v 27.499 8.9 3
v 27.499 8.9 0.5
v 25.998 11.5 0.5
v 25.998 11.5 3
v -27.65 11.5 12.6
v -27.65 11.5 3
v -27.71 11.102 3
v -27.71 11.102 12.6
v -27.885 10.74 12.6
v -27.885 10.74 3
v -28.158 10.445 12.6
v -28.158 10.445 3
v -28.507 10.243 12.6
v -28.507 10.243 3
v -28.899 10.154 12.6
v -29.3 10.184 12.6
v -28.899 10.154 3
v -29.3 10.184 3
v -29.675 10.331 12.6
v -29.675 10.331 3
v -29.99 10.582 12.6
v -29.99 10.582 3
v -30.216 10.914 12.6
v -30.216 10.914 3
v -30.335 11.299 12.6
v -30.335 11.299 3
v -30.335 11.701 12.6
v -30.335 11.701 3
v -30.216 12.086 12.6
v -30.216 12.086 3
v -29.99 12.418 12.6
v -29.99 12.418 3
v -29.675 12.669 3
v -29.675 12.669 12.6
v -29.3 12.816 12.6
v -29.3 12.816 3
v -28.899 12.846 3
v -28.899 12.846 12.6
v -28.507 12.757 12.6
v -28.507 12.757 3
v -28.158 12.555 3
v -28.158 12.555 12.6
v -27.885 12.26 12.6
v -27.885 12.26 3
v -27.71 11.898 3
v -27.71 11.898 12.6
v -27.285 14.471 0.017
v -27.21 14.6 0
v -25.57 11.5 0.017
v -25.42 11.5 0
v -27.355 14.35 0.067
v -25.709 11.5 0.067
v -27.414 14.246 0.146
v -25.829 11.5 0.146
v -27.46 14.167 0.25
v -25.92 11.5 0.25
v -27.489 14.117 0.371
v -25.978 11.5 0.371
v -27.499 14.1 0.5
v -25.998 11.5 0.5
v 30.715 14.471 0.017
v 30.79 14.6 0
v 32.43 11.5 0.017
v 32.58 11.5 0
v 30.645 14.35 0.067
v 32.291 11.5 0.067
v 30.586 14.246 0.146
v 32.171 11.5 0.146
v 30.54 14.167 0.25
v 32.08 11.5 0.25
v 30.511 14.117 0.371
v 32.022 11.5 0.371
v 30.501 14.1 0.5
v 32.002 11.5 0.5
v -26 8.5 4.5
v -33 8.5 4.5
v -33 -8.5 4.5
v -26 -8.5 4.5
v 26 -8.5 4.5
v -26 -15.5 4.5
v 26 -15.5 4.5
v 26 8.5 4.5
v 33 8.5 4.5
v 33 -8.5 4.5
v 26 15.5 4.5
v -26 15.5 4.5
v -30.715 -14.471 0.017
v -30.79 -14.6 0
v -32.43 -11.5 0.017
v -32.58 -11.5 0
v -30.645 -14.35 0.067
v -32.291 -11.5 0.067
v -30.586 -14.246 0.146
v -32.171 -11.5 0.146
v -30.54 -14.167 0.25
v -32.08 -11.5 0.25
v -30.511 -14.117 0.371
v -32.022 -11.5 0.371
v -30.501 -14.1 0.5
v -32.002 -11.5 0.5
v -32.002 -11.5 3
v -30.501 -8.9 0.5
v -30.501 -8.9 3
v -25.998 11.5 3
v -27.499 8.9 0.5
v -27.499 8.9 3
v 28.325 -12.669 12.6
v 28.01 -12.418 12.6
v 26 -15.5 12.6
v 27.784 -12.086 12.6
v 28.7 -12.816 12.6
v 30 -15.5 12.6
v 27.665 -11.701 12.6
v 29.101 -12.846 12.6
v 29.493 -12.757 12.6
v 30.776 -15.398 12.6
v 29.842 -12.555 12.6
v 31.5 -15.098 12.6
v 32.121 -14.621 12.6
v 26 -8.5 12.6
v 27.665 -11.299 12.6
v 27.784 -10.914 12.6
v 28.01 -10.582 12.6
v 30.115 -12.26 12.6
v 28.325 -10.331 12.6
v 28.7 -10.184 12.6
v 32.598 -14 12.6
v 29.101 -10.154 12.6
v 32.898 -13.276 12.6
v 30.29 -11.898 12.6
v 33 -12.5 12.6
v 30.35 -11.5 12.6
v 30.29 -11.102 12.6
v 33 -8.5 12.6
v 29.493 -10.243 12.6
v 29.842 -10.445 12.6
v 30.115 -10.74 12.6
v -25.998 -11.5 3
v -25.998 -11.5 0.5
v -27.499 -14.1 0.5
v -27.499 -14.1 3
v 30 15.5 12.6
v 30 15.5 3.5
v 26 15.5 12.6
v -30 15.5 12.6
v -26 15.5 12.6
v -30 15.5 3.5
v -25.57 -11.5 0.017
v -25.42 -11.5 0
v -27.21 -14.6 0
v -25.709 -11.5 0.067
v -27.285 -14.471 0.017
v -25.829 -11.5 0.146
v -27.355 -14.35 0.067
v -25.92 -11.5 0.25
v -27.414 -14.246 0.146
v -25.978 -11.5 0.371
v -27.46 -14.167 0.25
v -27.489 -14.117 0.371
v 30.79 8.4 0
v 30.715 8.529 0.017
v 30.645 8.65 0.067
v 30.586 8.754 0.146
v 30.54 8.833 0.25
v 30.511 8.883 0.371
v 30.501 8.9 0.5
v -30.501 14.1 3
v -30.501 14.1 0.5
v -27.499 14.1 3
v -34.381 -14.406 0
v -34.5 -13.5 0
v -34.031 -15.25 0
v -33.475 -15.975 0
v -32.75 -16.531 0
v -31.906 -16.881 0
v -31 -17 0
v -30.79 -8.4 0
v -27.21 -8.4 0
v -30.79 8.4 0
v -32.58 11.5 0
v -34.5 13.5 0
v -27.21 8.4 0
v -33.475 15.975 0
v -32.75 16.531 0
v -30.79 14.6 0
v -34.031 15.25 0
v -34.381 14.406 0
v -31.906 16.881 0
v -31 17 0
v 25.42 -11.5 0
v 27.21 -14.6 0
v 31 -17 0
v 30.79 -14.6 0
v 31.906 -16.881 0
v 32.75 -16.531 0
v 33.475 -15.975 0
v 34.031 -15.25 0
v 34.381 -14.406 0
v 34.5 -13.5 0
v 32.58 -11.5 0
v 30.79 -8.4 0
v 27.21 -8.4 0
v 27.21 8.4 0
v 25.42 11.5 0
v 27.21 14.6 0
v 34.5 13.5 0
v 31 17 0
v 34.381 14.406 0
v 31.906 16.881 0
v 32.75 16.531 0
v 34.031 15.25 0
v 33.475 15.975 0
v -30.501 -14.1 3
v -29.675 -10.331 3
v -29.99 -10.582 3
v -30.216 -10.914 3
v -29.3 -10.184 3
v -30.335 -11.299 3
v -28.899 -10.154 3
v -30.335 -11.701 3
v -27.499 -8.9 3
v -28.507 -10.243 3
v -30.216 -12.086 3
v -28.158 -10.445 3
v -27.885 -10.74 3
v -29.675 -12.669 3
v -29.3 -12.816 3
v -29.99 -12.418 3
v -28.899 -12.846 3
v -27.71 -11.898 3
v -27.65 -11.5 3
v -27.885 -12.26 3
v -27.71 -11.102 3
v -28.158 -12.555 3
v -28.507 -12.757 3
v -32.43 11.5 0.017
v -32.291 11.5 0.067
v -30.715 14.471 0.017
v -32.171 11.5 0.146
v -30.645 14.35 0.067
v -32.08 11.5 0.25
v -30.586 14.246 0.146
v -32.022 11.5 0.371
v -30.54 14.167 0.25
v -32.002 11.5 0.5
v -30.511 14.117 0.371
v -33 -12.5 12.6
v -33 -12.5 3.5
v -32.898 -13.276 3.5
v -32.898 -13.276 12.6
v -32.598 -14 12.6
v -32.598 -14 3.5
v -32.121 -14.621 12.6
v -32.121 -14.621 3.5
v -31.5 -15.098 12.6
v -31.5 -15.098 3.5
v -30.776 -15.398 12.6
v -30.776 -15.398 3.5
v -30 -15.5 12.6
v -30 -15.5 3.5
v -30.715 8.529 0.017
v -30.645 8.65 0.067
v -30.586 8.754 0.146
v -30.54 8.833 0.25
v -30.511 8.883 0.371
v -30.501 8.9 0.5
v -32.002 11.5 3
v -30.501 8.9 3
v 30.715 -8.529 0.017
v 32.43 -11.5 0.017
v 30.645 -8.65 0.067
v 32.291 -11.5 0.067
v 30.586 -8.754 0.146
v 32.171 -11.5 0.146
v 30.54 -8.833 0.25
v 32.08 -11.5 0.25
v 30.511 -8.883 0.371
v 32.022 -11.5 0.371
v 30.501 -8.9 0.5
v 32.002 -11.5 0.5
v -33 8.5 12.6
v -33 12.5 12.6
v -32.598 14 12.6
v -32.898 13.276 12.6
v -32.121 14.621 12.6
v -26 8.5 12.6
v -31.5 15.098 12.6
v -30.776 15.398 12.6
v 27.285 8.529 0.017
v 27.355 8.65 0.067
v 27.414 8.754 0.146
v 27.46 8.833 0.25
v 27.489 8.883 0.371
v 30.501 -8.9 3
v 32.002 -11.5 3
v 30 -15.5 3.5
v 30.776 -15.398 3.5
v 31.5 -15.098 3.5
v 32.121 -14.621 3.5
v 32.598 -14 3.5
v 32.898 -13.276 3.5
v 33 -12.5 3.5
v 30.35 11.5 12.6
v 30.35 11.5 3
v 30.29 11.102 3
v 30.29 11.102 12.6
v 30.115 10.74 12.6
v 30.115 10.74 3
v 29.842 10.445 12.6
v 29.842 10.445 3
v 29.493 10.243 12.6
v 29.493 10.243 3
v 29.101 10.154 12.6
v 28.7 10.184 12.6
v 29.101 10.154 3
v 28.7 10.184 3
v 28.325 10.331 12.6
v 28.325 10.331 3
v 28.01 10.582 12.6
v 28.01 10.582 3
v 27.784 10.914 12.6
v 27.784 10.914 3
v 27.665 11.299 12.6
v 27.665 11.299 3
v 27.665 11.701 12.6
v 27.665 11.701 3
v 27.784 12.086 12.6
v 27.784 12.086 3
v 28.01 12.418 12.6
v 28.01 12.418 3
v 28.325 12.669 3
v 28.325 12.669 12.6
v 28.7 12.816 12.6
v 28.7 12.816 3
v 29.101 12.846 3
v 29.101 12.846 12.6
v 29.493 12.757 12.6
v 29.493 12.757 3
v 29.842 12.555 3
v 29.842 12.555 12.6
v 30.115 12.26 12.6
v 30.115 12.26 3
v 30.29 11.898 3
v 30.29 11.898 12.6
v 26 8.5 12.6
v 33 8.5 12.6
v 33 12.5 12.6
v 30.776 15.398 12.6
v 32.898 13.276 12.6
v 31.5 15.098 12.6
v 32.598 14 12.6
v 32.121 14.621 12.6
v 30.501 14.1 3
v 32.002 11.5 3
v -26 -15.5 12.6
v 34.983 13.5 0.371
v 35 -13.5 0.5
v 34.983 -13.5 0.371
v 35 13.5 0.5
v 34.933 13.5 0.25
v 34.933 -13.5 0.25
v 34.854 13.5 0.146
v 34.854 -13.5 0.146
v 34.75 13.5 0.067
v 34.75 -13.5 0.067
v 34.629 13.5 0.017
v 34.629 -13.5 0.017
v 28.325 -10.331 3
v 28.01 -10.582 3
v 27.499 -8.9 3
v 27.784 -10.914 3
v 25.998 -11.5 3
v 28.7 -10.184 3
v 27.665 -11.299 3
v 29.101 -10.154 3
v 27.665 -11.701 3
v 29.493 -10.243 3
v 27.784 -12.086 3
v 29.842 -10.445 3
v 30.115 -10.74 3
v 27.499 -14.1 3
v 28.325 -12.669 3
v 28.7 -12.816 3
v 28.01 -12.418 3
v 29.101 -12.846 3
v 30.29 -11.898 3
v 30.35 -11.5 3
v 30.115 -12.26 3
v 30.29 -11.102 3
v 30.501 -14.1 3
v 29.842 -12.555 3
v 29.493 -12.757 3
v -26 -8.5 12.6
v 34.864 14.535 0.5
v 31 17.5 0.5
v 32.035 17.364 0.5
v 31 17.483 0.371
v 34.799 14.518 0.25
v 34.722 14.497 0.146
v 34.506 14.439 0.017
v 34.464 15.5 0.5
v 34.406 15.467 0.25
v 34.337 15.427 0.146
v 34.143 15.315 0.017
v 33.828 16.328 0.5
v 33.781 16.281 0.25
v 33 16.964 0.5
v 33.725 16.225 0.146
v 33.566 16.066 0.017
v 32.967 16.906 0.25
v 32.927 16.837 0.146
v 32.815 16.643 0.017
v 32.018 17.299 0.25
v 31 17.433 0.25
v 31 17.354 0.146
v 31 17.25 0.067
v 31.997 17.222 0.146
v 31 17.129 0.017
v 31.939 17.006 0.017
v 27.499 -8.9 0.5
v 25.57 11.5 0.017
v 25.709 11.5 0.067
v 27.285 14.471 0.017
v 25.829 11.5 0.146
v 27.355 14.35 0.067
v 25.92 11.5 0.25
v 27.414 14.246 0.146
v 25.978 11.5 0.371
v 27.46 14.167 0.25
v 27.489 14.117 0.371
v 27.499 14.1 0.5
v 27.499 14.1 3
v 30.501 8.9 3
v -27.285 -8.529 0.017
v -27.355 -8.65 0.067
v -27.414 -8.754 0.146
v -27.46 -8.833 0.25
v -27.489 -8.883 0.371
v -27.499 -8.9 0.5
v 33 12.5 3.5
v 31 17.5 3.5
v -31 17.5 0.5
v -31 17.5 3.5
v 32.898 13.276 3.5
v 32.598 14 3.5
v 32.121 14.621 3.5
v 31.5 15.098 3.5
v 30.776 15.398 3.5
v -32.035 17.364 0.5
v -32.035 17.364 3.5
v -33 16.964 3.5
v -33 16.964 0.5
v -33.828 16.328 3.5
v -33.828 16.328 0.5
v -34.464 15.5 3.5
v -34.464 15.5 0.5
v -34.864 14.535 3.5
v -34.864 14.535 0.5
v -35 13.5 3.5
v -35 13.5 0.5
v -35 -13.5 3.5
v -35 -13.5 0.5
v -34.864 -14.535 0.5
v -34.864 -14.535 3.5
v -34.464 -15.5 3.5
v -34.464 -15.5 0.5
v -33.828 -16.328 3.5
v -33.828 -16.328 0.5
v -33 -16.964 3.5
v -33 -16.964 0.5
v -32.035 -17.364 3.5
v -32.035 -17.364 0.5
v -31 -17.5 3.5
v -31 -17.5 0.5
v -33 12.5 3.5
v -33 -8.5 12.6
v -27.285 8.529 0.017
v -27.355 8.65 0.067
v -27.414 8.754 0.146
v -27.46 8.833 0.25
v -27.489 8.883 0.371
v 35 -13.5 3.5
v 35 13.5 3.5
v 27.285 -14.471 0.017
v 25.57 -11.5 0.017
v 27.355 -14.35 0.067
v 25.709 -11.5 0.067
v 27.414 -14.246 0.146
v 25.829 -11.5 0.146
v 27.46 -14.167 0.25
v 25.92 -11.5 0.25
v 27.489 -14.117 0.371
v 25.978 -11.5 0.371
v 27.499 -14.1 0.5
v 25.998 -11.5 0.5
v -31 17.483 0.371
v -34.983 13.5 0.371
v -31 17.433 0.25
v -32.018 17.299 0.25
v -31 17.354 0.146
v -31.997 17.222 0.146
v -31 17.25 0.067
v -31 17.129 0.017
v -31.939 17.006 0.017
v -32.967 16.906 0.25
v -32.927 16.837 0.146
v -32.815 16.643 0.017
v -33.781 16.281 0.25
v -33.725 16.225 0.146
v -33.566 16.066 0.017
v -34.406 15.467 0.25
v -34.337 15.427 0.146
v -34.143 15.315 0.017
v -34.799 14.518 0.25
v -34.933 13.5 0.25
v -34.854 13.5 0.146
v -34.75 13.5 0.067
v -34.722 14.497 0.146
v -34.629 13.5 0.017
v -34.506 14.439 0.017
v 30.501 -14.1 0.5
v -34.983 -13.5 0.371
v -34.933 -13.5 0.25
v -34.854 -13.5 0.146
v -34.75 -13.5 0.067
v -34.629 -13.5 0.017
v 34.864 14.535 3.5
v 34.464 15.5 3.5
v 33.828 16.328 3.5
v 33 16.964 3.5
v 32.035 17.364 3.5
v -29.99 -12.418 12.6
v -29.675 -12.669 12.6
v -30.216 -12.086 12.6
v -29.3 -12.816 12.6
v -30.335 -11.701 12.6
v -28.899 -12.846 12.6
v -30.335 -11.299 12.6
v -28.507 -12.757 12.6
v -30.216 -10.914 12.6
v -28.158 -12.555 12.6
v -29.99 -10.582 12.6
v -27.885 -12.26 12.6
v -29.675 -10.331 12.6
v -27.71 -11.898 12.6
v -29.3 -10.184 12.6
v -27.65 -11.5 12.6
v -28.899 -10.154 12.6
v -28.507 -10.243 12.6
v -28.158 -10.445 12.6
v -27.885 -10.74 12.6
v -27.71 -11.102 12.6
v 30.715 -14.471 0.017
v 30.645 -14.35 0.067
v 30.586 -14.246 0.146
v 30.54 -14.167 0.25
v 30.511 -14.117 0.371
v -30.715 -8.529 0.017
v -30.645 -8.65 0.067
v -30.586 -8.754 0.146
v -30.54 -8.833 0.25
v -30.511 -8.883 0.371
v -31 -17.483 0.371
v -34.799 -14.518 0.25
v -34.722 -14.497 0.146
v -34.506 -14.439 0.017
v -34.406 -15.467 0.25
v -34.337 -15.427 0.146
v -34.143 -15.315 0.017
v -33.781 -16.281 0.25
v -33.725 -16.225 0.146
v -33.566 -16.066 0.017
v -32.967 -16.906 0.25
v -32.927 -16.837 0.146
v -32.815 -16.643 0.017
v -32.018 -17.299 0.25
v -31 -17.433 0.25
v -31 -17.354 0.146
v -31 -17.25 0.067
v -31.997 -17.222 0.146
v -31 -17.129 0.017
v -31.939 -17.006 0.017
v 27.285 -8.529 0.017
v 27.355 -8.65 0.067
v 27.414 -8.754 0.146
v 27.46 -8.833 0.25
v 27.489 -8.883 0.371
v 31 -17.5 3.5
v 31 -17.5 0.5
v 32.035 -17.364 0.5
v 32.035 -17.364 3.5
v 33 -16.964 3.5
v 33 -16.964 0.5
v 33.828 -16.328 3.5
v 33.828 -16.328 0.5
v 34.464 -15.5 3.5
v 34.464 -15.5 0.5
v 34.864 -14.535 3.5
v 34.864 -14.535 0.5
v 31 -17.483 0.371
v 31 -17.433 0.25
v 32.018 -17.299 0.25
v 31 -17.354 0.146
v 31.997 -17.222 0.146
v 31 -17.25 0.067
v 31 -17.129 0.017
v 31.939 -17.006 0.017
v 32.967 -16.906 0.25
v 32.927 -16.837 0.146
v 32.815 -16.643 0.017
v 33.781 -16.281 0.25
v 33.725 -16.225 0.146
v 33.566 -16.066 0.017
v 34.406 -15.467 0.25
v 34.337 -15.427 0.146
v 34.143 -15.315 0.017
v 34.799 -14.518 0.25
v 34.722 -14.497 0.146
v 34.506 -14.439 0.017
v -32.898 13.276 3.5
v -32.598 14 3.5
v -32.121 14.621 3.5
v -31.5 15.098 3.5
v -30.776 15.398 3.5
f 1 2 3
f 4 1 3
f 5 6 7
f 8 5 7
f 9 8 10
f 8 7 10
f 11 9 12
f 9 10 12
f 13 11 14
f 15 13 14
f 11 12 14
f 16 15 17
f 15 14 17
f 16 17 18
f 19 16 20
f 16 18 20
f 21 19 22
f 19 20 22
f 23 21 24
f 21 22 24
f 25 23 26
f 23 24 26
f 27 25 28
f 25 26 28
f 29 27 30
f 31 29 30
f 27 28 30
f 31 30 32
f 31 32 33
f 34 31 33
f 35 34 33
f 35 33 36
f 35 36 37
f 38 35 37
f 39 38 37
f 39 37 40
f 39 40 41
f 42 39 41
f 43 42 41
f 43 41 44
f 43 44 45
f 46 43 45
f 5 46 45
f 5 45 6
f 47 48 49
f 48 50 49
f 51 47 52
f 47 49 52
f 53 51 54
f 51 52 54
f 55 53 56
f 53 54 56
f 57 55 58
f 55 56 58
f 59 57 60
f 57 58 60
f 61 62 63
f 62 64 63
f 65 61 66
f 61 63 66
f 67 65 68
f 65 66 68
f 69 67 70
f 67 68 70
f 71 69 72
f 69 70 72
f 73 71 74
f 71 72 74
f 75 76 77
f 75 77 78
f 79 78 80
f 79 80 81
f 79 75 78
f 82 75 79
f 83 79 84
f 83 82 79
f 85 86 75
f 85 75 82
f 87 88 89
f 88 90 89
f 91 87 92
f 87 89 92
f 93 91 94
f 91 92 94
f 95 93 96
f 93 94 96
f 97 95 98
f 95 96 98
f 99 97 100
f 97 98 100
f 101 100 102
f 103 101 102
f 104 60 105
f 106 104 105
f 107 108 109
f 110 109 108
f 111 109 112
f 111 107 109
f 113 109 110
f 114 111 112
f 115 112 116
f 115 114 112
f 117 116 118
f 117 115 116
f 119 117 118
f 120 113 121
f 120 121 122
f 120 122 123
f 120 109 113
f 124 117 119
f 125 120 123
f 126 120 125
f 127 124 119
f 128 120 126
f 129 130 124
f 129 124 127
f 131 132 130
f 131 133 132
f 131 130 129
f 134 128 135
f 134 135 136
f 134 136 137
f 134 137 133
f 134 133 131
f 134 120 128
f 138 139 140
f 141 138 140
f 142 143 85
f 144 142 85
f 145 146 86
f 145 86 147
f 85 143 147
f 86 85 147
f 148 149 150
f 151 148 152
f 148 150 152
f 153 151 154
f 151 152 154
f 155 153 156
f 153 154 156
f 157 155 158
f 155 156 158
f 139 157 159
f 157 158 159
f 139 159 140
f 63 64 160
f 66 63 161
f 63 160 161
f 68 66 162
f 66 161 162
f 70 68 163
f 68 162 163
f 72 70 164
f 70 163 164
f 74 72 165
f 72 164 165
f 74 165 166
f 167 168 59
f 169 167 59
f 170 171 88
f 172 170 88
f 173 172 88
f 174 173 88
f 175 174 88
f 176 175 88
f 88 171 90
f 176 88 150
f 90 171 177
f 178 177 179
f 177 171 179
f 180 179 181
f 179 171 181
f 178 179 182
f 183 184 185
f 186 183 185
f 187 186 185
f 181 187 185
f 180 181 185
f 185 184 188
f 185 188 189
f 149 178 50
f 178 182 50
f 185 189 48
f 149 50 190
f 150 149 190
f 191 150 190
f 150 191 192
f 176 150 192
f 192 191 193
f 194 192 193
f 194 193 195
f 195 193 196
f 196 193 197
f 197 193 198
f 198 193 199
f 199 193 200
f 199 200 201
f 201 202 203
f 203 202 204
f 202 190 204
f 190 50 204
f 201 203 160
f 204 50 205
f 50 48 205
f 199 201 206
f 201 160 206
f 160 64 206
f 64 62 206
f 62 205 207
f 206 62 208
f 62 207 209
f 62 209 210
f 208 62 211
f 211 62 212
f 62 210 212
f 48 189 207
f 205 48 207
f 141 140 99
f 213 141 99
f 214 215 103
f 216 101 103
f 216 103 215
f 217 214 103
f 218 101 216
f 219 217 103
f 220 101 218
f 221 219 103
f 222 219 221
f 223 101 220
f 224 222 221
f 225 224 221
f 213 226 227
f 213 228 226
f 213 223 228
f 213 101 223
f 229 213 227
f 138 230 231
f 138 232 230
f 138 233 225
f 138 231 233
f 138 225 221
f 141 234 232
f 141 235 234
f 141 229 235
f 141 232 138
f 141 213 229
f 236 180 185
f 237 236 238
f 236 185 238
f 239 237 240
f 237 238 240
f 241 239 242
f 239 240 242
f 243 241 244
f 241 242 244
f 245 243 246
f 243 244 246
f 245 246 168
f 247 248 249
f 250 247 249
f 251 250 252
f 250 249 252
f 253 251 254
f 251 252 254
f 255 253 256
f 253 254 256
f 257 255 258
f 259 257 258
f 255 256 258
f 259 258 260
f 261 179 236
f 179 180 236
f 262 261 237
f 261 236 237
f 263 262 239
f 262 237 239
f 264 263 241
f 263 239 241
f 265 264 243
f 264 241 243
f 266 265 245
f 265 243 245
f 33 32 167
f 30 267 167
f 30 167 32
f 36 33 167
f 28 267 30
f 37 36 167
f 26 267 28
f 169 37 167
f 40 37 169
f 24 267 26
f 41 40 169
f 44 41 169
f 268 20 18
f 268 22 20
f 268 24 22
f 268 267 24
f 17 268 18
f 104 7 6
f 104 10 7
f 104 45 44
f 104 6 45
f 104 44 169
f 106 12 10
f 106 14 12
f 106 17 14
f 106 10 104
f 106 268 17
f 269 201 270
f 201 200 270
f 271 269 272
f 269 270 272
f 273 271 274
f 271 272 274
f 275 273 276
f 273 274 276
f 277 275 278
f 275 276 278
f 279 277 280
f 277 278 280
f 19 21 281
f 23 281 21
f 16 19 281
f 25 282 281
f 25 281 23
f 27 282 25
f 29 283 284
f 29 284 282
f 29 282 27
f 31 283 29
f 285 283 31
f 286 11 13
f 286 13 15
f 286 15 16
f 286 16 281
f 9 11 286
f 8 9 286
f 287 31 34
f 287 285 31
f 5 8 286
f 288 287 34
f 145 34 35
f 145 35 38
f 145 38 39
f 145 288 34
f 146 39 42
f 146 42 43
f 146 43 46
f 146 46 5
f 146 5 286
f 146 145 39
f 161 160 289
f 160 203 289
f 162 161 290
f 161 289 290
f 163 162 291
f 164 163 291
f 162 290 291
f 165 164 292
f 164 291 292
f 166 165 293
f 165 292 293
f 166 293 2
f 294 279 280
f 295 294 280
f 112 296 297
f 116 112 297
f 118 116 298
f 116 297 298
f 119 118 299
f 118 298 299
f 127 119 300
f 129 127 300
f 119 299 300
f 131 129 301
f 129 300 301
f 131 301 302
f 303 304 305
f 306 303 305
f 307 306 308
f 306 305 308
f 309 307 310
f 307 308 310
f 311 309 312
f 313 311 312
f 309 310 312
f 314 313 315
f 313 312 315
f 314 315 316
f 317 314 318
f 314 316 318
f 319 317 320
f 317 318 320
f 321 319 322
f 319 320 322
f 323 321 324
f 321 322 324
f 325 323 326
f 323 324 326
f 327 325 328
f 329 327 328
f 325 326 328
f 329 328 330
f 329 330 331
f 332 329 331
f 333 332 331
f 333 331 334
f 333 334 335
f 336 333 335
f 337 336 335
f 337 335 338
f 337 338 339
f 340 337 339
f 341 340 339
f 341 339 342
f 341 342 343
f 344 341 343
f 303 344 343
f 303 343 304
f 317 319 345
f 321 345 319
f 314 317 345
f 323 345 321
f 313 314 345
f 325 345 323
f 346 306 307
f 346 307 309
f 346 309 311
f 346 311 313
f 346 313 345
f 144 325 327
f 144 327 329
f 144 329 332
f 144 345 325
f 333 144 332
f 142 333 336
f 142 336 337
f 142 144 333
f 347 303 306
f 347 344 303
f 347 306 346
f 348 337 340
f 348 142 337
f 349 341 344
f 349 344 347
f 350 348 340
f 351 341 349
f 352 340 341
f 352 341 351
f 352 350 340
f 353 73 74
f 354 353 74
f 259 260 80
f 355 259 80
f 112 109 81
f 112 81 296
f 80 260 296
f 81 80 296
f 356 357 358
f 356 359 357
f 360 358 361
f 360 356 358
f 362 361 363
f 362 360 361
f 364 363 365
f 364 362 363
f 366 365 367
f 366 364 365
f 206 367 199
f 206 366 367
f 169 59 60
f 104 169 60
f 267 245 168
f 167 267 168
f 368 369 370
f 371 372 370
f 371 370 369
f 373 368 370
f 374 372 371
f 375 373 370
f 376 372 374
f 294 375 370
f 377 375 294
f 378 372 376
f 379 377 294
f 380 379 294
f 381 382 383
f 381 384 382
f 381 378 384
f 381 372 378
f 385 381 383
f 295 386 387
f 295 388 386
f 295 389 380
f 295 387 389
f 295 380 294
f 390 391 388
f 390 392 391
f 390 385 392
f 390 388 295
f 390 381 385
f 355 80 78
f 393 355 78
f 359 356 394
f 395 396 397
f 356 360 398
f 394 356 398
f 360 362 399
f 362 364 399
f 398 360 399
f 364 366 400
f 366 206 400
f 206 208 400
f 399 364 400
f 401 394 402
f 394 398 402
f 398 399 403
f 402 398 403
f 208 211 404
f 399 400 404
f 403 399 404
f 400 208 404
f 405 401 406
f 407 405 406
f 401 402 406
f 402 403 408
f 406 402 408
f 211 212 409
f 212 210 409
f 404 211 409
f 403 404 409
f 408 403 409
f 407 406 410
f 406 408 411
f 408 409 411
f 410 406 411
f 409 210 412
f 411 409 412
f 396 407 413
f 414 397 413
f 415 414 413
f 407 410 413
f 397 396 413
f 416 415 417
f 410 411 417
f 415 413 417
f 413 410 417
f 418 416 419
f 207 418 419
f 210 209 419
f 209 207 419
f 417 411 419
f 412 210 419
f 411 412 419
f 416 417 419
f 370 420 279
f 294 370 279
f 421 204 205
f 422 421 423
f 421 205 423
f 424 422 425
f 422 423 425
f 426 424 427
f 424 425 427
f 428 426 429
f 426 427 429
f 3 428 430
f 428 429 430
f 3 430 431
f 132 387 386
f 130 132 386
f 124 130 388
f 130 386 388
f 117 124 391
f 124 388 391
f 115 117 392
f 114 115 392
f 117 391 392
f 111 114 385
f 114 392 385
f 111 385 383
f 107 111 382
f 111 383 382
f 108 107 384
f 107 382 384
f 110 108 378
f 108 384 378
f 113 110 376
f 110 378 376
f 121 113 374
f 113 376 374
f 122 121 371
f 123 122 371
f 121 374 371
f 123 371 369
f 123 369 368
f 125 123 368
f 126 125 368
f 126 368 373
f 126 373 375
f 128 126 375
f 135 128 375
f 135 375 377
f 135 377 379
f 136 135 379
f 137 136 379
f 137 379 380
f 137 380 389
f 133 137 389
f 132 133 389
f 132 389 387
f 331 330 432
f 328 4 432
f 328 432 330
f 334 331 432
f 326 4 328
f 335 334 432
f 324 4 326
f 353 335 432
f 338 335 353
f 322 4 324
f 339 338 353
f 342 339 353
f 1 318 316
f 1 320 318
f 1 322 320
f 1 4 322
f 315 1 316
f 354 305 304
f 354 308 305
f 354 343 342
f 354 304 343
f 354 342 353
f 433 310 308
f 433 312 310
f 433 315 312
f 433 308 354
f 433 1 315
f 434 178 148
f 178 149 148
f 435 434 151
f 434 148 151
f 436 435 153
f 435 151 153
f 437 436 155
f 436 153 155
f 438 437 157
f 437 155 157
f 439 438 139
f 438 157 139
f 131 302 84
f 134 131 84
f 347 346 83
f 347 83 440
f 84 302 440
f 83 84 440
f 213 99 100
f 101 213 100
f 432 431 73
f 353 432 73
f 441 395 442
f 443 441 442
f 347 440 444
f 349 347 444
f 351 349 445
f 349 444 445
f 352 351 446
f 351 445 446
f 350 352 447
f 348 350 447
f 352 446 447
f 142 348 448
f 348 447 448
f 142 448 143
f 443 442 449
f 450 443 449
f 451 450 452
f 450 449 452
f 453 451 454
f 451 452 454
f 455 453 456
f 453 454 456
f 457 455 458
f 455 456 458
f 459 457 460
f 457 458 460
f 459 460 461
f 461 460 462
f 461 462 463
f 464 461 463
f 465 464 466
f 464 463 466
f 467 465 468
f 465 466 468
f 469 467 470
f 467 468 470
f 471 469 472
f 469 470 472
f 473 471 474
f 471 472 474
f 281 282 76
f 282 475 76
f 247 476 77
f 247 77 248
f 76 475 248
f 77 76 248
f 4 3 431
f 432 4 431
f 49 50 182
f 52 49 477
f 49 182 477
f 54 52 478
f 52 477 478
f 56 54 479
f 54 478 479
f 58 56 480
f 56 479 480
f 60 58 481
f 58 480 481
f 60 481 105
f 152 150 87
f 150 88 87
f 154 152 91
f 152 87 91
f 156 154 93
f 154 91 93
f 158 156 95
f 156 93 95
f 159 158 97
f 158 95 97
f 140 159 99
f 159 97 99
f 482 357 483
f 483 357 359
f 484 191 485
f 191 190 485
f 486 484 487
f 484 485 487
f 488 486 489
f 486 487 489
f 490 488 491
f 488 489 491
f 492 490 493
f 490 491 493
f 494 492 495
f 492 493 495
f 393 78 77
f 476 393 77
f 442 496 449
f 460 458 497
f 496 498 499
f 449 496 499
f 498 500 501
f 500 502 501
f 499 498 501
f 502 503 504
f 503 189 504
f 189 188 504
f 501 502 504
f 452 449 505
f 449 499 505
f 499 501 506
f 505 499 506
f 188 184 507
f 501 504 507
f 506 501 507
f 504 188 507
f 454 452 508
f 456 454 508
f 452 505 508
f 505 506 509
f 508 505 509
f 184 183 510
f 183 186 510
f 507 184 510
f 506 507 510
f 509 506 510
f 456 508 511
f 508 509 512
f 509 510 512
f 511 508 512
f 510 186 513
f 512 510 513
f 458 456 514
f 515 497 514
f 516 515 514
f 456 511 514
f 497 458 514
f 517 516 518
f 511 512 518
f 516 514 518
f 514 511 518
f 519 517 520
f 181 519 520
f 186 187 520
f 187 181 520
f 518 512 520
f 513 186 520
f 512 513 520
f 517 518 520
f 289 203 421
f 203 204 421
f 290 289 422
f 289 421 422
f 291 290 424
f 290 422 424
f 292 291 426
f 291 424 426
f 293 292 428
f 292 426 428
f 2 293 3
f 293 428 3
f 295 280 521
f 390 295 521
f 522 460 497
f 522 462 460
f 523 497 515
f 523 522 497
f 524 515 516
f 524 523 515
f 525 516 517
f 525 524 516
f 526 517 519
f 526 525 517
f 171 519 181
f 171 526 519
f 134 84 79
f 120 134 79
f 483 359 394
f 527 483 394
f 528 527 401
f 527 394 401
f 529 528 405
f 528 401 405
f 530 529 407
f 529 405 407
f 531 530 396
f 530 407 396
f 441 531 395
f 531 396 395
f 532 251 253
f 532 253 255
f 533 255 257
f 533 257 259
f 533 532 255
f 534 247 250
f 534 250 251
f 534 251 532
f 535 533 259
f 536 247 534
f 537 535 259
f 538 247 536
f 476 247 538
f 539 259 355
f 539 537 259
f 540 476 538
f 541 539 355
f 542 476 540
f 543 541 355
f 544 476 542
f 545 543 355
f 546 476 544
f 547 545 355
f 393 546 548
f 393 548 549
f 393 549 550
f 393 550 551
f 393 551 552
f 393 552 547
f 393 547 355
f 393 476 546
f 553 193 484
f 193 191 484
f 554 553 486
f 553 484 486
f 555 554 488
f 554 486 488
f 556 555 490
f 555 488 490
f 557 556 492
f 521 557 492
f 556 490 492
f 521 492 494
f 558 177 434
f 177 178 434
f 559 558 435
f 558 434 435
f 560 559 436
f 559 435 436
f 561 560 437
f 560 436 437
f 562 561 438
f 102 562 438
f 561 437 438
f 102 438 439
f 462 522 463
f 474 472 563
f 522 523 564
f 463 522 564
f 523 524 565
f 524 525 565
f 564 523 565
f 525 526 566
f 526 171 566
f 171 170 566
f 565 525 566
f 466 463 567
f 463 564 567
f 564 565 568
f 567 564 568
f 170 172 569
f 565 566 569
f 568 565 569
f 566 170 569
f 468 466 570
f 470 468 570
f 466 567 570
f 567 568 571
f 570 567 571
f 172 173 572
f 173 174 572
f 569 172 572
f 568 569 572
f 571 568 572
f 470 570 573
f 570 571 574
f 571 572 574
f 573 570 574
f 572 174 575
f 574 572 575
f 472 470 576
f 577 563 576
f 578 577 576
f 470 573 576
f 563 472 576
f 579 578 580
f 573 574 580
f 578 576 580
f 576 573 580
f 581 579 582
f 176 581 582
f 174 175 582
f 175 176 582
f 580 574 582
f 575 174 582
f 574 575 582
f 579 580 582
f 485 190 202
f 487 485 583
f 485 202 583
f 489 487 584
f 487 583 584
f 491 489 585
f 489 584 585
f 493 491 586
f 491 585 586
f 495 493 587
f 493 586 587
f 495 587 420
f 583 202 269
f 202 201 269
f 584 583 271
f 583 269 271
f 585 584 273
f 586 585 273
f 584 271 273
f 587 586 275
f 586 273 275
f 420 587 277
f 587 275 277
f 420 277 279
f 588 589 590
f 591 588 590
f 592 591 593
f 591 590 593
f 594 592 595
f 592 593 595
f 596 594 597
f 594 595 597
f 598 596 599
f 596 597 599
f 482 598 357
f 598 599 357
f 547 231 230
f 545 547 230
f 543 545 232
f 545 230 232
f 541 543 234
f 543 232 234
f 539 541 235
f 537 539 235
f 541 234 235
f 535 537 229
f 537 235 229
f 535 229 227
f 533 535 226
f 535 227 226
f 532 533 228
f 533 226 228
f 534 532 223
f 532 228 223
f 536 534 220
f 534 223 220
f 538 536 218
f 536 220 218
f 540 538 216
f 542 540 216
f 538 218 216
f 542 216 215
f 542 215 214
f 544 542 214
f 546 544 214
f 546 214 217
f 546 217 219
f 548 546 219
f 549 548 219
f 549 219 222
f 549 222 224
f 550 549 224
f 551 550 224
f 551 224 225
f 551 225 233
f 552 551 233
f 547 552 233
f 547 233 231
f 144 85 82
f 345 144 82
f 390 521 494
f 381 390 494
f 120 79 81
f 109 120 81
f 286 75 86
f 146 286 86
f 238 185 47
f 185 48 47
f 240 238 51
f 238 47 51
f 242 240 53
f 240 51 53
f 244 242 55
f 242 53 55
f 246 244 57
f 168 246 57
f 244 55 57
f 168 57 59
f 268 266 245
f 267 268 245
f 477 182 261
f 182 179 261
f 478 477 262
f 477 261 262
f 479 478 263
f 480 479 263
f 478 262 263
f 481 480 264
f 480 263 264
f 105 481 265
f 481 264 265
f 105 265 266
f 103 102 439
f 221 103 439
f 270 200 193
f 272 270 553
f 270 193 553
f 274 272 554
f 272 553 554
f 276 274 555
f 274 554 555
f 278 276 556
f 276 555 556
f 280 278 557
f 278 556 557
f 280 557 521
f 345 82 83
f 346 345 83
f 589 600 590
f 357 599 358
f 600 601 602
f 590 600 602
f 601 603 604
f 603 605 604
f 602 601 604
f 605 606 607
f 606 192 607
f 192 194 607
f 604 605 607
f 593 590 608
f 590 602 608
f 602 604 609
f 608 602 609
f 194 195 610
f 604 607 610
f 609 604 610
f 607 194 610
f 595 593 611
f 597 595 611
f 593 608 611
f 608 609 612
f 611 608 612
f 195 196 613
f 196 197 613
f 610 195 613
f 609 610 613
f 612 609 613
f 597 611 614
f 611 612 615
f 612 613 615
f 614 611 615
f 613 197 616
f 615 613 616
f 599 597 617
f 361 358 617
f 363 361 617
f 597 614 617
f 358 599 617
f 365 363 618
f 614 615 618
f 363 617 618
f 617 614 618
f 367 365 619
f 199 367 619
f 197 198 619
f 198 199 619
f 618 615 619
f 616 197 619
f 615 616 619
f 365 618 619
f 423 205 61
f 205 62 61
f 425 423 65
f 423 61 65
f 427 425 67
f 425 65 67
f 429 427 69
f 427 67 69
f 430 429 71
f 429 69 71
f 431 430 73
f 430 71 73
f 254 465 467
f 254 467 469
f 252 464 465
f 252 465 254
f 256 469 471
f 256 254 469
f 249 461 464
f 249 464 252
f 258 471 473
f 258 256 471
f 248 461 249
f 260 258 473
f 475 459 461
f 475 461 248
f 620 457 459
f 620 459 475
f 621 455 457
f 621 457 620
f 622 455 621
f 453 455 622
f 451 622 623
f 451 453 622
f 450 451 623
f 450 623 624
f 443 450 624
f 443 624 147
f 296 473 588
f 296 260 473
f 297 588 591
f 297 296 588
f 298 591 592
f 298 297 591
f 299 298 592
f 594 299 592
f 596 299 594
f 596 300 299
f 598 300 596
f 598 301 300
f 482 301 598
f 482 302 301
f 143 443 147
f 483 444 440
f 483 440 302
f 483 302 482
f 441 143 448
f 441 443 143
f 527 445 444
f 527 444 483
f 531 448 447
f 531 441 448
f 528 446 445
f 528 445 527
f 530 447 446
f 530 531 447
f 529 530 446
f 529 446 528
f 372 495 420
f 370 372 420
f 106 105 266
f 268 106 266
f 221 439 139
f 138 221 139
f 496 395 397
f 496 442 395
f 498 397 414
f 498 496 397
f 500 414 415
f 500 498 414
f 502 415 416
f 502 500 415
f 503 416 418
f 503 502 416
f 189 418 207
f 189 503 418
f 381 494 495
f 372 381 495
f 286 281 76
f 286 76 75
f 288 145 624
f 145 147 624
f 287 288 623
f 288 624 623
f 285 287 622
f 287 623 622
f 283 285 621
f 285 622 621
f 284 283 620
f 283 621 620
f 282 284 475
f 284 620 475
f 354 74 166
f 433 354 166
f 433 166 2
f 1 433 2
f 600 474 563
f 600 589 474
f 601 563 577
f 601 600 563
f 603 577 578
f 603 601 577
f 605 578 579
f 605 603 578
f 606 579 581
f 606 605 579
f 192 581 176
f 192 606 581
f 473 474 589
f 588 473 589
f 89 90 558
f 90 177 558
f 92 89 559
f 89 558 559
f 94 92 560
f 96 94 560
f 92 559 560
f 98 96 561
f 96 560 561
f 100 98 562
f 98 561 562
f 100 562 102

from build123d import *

# Parameters (mm, degrees)
F1_DEPTH = 3.5
F3_DEPTH = 1
F5_DEPTH = 8.1
F6_R     = 1.35
F7_DEPTH = 3
F8_DEPTH = 12.601
F9_R     = 0.5


with BuildPart() as f1:
    # F0 (on Top) → F1 (new body)
    with BuildSketch(Plane.XY):
        with BuildLine():
            Line((31, 17.5), (-31, 17.5))
            ThreePointArc((-31, 17.5), (-33.8284271247, 16.3284271247), (-35, 13.5))
            Line((-35, 13.5), (-35, -13.5))
            ThreePointArc((-35, -13.5), (-33.8284271247, -16.3284271247), (-31, -17.5))
            Line((-31, -17.5), (31, -17.5))
            ThreePointArc((31, -17.5), (33.8284271247, -16.3284271247), (35, -13.5))
            Line((35, -13.5), (35, 13.5))
            ThreePointArc((35, 13.5), (33.8284271247, 16.3284271247), (31, 17.5))
        make_face()
    extrude(amount=F1_DEPTH)

    # F2 (on face) → F3 (join)
    with BuildSketch(Plane.XY.offset(3.5)):
        with BuildLine():
            Line((29.9999990687, 15.5), (-30.0000009313, 15.5))
            ThreePointArc((-30.0000009313, 15.5), (-32.1213212749, 14.6213203436), (-33.0000009313, 12.5))
            Line((-33.0000009313, 12.5), (-33.0000009313, -12.5))
            ThreePointArc((-33.0000009313, -12.5), (-32.1213212749, -14.6213203436), (-30.0000009313, -15.5))
            Line((-30.0000009313, -15.5), (29.9999990687, -15.5))
            ThreePointArc((29.9999990687, -15.5), (32.1213194122, -14.6213203436), (32.9999990687, -12.5))
            Line((32.9999990687, -12.5), (32.9999990687, 12.5))
            ThreePointArc((32.9999990687, 12.5), (32.1213194122, 14.6213203436), (29.9999990687, 15.5))
        make_face()
    extrude(amount=F3_DEPTH)

    # F4 (on face) → F5 (join)
    with BuildSketch(Plane.XY.offset(4.5)):
        with BuildLine():
            Line((-26, 15.5), (-30.0000009313, 15.5))
            ThreePointArc((-30.0000009313, 15.5), (-32.1213212749, 14.6213203436), (-33.0000009313, 12.5))
            Line((-33.0000009313, 12.5), (-33.0000009313, 8.5))
            Line((-33.0000009313, 8.5), (-26, 8.5))
            Line((-26, 8.5), (-26, 15.5))
        make_face()
        with BuildLine():
            Line((-26, -8.5), (-33.0000009313, -8.5))
            Line((-33.0000009313, -8.5), (-33.0000009313, -12.5))
            ThreePointArc((-33.0000009313, -12.5), (-32.1213212749, -14.6213203436), (-30.0000009313, -15.5))
            Line((-30.0000009313, -15.5), (-26, -15.5))
            Line((-26, -15.5), (-26, -8.5))
        make_face()
        with BuildLine():
            Line((29.9999990687, 15.5), (26, 15.5))
            Line((26, 15.5), (26, 8.5))
            Line((26, 8.5), (32.9999990687, 8.5))
            Line((32.9999990687, 8.5), (32.9999990687, 12.5))
            ThreePointArc((32.9999990687, 12.5), (32.1213194122, 14.6213203436), (29.9999990687, 15.5))
        make_face()
        with BuildLine():
            Line((32.9999990687, -12.5), (32.9999990687, -8.5))
            Line((32.9999990687, -8.5), (26, -8.5))
            Line((26, -8.5), (26, -15.5))
            Line((26, -15.5), (29.9999990687, -15.5))
            ThreePointArc((29.9999990687, -15.5), (32.1213194122, -14.6213203436), (32.9999990687, -12.5))
        make_face()
    extrude(amount=F5_DEPTH)

    # F6 (on face) → F7 (cut)
    with BuildSketch(Plane(origin=(0, 0, 0), x_dir=(1, 0, 0), z_dir=(0, 0, -1))):
        Polygon((-30.5011106999, 8.9), (-27.4988893001, 8.9), (-25.9977786002, 11.5), (-27.4988893001, 14.1), (-30.5011106999, 14.1), (-32.0022213998, 11.5), align=None)
        with Locations((-29, 11.5)):
            Circle(F6_R, mode=Mode.SUBTRACT)
        Polygon((27.4988893001, 8.9), (30.5011106999, 8.9), (32.0022213998, 11.5), (30.5011106999, 14.1), (27.4988893001, 14.1), (25.9977786002, 11.5), align=None)
        with Locations((29, 11.5)):
            Circle(F6_R, mode=Mode.SUBTRACT)
        Polygon((30.5011106999, -8.9), (27.4988893001, -8.9), (25.9977786002, -11.5), (27.4988893001, -14.1), (30.5011106999, -14.1), (32.0022213998, -11.5), align=None)
        with Locations((29, -11.5)):
            Circle(F6_R, mode=Mode.SUBTRACT)
        Polygon((-27.4988893001, -8.9), (-30.5011106999, -8.9), (-32.0022213998, -11.5), (-30.5011106999, -14.1), (-27.4988893001, -14.1), (-25.9977786002, -11.5), align=None)
        with Locations((-29, -11.5)):
            Circle(F6_R, mode=Mode.SUBTRACT)
    extrude(amount=-F7_DEPTH, mode=Mode.SUBTRACT)

    # F8 (cut, through all): faces of the model
    f8_faces = [f1.faces().sort_by_distance(p)[0] for p in [
        (-29, -11.5, 0),
        (29, -11.5, 0),
        (29, 11.5, 0),
        (-29, 11.5, 0),
    ]]
    extrude(f8_faces, amount=-F8_DEPTH, mode=Mode.SUBTRACT)

    # F9
    f9_edges = [f1.edges().sort_by_distance(p)[0] for p in [
        (0, 17.5, 0),
        (33.828427, 16.328427, 0),
        (-33.828427, 16.328427, 0),
        (35, 0, 0),
        (-35, 0, 0),
        (33.828427, -16.328427, 0),
        (-33.828427, -16.328427, 0),
        (0, -17.5, 0),
        (-31.251666, -12.8, 0),
        (-29, -14.1, 0),
        (-26.748334, -12.8, 0),
        (-26.748334, -10.2, 0),
        (-29, -8.9, 0),
        (-31.251666, -10.2, 0),
        (26.748334, -10.2, 0),
        (26.748334, -12.8, 0),
        (29, -14.1, 0),
        (31.251666, -12.8, 0),
        (31.251666, -10.2, 0),
        (29, -8.9, 0),
        (-26.748334, 10.2, 0),
        (-26.748334, 12.8, 0),
        (-29, 14.1, 0),
        (-31.251666, 12.8, 0),
        (-31.251666, 10.2, 0),
        (-29, 8.9, 0),
        (31.251666, 10.2, 0),
        (31.251666, 12.8, 0),
        (29, 14.1, 0),
        (26.748334, 12.8, 0),
        (26.748334, 10.2, 0),
        (29, 8.9, 0),
    ]]
    fillet(f9_edges, radius=F9_R)


solid = f1.part
